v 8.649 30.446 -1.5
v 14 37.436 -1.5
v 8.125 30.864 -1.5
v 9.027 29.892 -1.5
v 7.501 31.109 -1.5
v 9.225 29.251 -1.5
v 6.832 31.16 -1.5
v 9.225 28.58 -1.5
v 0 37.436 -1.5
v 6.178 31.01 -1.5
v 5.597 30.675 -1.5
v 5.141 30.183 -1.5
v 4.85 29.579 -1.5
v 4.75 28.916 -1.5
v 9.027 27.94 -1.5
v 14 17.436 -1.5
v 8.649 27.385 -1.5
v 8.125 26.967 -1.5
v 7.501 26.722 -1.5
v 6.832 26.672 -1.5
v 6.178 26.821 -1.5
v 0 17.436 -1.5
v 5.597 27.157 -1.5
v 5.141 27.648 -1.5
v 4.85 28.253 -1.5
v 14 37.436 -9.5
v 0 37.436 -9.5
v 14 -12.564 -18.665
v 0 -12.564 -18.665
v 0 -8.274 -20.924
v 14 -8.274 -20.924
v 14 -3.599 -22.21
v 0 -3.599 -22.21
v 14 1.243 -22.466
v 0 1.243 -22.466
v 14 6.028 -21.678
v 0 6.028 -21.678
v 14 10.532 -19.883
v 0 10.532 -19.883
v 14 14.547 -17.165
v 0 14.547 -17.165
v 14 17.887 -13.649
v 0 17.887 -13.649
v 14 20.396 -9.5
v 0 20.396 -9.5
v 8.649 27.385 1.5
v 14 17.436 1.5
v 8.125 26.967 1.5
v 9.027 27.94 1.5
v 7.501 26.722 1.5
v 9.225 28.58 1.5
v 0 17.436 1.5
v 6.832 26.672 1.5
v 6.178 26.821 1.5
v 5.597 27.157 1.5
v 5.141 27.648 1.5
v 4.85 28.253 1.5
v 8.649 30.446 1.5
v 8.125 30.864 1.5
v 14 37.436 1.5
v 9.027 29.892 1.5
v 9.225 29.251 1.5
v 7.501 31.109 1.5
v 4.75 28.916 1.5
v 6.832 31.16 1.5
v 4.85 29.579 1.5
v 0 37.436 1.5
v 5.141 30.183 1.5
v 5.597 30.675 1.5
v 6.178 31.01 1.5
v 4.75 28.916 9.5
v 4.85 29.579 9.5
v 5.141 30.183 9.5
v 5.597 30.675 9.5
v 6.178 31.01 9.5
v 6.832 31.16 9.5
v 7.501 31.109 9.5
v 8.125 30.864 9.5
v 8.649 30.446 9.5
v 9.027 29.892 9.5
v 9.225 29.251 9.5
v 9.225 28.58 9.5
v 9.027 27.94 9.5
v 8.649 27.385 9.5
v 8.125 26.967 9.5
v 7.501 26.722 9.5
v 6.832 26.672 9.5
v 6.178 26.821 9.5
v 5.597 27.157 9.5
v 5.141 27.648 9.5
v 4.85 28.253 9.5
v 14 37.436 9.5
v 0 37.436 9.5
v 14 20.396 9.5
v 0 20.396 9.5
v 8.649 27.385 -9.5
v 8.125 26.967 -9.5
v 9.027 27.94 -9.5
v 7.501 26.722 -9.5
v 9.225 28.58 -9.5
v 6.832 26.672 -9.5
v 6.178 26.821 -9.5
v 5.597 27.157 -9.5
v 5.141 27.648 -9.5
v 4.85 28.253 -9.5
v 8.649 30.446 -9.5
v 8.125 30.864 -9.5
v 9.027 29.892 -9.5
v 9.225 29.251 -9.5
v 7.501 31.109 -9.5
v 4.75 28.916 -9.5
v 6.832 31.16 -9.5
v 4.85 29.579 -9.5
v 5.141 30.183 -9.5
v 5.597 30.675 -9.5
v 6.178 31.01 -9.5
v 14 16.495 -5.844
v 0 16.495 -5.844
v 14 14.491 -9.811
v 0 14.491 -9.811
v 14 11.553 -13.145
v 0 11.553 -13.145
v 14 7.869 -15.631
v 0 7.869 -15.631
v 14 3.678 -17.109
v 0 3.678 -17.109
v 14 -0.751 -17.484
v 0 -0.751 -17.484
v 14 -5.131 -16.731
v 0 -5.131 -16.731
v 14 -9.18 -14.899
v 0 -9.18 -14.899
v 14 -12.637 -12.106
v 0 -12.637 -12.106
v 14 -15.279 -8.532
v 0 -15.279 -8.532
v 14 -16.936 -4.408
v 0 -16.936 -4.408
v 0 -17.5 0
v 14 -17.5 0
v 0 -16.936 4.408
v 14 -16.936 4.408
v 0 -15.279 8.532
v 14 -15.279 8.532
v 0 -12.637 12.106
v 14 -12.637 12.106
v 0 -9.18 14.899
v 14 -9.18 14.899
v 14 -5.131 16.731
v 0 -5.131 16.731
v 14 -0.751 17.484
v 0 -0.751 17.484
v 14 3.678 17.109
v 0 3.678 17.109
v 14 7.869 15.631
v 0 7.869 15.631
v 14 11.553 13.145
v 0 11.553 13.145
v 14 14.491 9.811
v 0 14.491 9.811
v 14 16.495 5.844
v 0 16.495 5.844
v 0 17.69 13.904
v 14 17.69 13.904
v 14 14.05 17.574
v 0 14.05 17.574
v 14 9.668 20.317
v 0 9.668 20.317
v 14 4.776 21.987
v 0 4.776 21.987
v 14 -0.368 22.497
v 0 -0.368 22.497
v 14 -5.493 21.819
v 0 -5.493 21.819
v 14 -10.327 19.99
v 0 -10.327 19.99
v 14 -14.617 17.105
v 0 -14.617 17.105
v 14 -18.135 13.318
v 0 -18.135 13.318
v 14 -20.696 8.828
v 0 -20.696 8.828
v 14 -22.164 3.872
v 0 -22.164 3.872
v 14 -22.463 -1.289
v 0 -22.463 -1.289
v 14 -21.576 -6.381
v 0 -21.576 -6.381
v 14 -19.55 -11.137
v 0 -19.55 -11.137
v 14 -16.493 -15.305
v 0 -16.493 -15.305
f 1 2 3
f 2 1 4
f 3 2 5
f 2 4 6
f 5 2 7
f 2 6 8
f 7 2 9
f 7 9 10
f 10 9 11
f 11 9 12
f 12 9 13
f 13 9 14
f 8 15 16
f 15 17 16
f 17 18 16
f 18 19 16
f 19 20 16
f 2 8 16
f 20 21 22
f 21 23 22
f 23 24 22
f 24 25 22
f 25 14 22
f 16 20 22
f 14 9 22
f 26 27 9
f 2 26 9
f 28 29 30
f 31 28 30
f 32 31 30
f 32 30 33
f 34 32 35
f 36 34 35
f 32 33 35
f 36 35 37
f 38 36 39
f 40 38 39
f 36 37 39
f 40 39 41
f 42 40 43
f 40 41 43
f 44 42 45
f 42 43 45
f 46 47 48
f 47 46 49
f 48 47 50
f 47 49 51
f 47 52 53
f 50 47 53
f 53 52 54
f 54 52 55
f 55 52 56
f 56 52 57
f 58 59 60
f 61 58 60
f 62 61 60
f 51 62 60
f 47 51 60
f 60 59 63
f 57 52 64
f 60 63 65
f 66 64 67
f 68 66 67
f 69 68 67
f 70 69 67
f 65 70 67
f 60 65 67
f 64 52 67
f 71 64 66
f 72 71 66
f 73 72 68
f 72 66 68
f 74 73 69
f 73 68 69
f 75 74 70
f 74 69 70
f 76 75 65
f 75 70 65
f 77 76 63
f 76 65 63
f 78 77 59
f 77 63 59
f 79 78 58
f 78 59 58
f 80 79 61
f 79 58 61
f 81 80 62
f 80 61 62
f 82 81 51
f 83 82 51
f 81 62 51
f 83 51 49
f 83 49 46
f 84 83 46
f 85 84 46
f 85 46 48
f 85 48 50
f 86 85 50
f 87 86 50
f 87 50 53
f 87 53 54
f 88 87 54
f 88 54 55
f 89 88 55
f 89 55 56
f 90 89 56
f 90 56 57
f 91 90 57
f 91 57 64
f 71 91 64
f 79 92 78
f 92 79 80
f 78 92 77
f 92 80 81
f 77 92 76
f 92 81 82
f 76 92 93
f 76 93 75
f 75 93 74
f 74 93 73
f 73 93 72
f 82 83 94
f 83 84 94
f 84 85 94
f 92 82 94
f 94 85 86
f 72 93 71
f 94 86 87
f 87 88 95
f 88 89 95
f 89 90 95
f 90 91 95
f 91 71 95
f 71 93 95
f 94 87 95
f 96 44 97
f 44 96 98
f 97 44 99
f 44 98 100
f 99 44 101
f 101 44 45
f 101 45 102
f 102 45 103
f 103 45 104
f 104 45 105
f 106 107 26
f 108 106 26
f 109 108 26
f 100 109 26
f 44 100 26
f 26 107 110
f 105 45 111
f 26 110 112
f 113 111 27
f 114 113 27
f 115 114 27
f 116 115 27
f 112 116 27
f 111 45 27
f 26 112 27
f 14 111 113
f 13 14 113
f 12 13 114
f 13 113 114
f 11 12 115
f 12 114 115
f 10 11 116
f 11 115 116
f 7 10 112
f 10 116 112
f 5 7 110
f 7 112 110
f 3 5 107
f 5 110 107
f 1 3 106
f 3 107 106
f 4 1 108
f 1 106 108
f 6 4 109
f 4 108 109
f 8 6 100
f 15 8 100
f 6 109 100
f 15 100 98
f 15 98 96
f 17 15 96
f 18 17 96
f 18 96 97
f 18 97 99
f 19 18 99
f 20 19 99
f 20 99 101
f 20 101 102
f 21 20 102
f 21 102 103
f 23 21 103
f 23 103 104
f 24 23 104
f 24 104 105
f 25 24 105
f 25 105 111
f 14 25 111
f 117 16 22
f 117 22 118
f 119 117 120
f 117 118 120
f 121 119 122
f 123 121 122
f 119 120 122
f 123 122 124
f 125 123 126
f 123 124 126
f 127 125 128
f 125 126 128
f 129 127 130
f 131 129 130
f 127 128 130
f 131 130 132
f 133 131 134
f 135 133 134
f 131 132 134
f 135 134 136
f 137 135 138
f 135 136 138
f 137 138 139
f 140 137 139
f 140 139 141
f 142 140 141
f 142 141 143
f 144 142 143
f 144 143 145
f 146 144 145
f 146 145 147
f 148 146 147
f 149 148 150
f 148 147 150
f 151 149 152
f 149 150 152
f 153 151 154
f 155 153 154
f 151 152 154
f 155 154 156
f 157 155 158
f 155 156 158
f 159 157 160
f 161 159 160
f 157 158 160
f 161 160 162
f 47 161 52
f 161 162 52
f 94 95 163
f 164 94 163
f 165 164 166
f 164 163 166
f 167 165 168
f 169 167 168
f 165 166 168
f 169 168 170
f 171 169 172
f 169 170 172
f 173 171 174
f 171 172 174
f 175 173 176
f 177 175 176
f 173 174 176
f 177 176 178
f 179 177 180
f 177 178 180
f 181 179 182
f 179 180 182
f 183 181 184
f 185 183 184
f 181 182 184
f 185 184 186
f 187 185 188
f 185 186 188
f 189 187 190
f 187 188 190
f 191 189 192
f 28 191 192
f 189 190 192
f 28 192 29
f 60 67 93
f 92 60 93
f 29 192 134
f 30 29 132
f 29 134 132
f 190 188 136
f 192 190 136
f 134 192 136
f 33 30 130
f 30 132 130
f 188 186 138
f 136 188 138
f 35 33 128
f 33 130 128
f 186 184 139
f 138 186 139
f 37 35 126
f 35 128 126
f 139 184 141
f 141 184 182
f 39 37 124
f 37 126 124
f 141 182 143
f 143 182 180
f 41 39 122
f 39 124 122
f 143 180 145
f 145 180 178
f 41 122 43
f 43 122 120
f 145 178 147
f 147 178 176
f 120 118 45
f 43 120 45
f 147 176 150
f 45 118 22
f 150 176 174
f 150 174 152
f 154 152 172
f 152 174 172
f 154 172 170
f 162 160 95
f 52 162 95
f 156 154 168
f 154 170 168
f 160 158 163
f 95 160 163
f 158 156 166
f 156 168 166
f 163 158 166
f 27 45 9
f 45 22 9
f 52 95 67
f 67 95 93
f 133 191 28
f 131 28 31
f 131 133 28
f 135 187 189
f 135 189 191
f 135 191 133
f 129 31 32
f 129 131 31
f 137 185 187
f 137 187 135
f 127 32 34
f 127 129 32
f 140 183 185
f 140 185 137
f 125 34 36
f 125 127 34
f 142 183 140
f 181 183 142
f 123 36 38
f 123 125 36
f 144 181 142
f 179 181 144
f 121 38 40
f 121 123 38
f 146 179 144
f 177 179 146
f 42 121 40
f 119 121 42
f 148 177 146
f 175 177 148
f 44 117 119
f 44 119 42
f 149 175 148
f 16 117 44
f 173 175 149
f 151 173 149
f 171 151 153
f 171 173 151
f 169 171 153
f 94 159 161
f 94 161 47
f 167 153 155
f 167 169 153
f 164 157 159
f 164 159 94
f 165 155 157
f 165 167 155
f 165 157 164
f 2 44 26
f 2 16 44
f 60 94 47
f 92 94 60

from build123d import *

# Parameters (mm, degrees)
F1_DEPTH = 14
F3_D     = 4.5


with BuildPart() as f1:
    # F0 (on Right) → F1 (new body)
    with BuildSketch(Plane.YZ):
        with BuildLine():
            ThreePointArc((17.4355957742, -1.5), (-17.5, 0), (17.4355957742, 1.5))
            Line((17.4355957742, 1.5), (37.4355957742, 1.5))
            Line((37.4355957742, 1.5), (37.4355957742, 9.5))
            Line((37.4355957742, 9.5), (20.3960780544, 9.5))
            ThreePointArc((20.3960780544, 9.5), (-14.6168366424, 17.1054987232), (-12.5644042258, -18.6650943327))
            ThreePointArc((-12.5644042258, -18.6650943327), (6.027729031, -21.6775571209), (20.3960780544, -9.5))
            Line((20.3960780544, -9.5), (37.4355957742, -9.5))
            Line((37.4355957742, -9.5), (37.4355957742, -1.5))
            Line((37.4355957742, -1.5), (17.4355957742, -1.5))
        make_face()
    extrude(amount=F1_DEPTH)

    # F3 (through all)
    with Locations(Plane.XY.offset(9.5)):
        with Locations((7, 28.9158369143)):
            Hole(F3_D / 2)


solid = f1.part
